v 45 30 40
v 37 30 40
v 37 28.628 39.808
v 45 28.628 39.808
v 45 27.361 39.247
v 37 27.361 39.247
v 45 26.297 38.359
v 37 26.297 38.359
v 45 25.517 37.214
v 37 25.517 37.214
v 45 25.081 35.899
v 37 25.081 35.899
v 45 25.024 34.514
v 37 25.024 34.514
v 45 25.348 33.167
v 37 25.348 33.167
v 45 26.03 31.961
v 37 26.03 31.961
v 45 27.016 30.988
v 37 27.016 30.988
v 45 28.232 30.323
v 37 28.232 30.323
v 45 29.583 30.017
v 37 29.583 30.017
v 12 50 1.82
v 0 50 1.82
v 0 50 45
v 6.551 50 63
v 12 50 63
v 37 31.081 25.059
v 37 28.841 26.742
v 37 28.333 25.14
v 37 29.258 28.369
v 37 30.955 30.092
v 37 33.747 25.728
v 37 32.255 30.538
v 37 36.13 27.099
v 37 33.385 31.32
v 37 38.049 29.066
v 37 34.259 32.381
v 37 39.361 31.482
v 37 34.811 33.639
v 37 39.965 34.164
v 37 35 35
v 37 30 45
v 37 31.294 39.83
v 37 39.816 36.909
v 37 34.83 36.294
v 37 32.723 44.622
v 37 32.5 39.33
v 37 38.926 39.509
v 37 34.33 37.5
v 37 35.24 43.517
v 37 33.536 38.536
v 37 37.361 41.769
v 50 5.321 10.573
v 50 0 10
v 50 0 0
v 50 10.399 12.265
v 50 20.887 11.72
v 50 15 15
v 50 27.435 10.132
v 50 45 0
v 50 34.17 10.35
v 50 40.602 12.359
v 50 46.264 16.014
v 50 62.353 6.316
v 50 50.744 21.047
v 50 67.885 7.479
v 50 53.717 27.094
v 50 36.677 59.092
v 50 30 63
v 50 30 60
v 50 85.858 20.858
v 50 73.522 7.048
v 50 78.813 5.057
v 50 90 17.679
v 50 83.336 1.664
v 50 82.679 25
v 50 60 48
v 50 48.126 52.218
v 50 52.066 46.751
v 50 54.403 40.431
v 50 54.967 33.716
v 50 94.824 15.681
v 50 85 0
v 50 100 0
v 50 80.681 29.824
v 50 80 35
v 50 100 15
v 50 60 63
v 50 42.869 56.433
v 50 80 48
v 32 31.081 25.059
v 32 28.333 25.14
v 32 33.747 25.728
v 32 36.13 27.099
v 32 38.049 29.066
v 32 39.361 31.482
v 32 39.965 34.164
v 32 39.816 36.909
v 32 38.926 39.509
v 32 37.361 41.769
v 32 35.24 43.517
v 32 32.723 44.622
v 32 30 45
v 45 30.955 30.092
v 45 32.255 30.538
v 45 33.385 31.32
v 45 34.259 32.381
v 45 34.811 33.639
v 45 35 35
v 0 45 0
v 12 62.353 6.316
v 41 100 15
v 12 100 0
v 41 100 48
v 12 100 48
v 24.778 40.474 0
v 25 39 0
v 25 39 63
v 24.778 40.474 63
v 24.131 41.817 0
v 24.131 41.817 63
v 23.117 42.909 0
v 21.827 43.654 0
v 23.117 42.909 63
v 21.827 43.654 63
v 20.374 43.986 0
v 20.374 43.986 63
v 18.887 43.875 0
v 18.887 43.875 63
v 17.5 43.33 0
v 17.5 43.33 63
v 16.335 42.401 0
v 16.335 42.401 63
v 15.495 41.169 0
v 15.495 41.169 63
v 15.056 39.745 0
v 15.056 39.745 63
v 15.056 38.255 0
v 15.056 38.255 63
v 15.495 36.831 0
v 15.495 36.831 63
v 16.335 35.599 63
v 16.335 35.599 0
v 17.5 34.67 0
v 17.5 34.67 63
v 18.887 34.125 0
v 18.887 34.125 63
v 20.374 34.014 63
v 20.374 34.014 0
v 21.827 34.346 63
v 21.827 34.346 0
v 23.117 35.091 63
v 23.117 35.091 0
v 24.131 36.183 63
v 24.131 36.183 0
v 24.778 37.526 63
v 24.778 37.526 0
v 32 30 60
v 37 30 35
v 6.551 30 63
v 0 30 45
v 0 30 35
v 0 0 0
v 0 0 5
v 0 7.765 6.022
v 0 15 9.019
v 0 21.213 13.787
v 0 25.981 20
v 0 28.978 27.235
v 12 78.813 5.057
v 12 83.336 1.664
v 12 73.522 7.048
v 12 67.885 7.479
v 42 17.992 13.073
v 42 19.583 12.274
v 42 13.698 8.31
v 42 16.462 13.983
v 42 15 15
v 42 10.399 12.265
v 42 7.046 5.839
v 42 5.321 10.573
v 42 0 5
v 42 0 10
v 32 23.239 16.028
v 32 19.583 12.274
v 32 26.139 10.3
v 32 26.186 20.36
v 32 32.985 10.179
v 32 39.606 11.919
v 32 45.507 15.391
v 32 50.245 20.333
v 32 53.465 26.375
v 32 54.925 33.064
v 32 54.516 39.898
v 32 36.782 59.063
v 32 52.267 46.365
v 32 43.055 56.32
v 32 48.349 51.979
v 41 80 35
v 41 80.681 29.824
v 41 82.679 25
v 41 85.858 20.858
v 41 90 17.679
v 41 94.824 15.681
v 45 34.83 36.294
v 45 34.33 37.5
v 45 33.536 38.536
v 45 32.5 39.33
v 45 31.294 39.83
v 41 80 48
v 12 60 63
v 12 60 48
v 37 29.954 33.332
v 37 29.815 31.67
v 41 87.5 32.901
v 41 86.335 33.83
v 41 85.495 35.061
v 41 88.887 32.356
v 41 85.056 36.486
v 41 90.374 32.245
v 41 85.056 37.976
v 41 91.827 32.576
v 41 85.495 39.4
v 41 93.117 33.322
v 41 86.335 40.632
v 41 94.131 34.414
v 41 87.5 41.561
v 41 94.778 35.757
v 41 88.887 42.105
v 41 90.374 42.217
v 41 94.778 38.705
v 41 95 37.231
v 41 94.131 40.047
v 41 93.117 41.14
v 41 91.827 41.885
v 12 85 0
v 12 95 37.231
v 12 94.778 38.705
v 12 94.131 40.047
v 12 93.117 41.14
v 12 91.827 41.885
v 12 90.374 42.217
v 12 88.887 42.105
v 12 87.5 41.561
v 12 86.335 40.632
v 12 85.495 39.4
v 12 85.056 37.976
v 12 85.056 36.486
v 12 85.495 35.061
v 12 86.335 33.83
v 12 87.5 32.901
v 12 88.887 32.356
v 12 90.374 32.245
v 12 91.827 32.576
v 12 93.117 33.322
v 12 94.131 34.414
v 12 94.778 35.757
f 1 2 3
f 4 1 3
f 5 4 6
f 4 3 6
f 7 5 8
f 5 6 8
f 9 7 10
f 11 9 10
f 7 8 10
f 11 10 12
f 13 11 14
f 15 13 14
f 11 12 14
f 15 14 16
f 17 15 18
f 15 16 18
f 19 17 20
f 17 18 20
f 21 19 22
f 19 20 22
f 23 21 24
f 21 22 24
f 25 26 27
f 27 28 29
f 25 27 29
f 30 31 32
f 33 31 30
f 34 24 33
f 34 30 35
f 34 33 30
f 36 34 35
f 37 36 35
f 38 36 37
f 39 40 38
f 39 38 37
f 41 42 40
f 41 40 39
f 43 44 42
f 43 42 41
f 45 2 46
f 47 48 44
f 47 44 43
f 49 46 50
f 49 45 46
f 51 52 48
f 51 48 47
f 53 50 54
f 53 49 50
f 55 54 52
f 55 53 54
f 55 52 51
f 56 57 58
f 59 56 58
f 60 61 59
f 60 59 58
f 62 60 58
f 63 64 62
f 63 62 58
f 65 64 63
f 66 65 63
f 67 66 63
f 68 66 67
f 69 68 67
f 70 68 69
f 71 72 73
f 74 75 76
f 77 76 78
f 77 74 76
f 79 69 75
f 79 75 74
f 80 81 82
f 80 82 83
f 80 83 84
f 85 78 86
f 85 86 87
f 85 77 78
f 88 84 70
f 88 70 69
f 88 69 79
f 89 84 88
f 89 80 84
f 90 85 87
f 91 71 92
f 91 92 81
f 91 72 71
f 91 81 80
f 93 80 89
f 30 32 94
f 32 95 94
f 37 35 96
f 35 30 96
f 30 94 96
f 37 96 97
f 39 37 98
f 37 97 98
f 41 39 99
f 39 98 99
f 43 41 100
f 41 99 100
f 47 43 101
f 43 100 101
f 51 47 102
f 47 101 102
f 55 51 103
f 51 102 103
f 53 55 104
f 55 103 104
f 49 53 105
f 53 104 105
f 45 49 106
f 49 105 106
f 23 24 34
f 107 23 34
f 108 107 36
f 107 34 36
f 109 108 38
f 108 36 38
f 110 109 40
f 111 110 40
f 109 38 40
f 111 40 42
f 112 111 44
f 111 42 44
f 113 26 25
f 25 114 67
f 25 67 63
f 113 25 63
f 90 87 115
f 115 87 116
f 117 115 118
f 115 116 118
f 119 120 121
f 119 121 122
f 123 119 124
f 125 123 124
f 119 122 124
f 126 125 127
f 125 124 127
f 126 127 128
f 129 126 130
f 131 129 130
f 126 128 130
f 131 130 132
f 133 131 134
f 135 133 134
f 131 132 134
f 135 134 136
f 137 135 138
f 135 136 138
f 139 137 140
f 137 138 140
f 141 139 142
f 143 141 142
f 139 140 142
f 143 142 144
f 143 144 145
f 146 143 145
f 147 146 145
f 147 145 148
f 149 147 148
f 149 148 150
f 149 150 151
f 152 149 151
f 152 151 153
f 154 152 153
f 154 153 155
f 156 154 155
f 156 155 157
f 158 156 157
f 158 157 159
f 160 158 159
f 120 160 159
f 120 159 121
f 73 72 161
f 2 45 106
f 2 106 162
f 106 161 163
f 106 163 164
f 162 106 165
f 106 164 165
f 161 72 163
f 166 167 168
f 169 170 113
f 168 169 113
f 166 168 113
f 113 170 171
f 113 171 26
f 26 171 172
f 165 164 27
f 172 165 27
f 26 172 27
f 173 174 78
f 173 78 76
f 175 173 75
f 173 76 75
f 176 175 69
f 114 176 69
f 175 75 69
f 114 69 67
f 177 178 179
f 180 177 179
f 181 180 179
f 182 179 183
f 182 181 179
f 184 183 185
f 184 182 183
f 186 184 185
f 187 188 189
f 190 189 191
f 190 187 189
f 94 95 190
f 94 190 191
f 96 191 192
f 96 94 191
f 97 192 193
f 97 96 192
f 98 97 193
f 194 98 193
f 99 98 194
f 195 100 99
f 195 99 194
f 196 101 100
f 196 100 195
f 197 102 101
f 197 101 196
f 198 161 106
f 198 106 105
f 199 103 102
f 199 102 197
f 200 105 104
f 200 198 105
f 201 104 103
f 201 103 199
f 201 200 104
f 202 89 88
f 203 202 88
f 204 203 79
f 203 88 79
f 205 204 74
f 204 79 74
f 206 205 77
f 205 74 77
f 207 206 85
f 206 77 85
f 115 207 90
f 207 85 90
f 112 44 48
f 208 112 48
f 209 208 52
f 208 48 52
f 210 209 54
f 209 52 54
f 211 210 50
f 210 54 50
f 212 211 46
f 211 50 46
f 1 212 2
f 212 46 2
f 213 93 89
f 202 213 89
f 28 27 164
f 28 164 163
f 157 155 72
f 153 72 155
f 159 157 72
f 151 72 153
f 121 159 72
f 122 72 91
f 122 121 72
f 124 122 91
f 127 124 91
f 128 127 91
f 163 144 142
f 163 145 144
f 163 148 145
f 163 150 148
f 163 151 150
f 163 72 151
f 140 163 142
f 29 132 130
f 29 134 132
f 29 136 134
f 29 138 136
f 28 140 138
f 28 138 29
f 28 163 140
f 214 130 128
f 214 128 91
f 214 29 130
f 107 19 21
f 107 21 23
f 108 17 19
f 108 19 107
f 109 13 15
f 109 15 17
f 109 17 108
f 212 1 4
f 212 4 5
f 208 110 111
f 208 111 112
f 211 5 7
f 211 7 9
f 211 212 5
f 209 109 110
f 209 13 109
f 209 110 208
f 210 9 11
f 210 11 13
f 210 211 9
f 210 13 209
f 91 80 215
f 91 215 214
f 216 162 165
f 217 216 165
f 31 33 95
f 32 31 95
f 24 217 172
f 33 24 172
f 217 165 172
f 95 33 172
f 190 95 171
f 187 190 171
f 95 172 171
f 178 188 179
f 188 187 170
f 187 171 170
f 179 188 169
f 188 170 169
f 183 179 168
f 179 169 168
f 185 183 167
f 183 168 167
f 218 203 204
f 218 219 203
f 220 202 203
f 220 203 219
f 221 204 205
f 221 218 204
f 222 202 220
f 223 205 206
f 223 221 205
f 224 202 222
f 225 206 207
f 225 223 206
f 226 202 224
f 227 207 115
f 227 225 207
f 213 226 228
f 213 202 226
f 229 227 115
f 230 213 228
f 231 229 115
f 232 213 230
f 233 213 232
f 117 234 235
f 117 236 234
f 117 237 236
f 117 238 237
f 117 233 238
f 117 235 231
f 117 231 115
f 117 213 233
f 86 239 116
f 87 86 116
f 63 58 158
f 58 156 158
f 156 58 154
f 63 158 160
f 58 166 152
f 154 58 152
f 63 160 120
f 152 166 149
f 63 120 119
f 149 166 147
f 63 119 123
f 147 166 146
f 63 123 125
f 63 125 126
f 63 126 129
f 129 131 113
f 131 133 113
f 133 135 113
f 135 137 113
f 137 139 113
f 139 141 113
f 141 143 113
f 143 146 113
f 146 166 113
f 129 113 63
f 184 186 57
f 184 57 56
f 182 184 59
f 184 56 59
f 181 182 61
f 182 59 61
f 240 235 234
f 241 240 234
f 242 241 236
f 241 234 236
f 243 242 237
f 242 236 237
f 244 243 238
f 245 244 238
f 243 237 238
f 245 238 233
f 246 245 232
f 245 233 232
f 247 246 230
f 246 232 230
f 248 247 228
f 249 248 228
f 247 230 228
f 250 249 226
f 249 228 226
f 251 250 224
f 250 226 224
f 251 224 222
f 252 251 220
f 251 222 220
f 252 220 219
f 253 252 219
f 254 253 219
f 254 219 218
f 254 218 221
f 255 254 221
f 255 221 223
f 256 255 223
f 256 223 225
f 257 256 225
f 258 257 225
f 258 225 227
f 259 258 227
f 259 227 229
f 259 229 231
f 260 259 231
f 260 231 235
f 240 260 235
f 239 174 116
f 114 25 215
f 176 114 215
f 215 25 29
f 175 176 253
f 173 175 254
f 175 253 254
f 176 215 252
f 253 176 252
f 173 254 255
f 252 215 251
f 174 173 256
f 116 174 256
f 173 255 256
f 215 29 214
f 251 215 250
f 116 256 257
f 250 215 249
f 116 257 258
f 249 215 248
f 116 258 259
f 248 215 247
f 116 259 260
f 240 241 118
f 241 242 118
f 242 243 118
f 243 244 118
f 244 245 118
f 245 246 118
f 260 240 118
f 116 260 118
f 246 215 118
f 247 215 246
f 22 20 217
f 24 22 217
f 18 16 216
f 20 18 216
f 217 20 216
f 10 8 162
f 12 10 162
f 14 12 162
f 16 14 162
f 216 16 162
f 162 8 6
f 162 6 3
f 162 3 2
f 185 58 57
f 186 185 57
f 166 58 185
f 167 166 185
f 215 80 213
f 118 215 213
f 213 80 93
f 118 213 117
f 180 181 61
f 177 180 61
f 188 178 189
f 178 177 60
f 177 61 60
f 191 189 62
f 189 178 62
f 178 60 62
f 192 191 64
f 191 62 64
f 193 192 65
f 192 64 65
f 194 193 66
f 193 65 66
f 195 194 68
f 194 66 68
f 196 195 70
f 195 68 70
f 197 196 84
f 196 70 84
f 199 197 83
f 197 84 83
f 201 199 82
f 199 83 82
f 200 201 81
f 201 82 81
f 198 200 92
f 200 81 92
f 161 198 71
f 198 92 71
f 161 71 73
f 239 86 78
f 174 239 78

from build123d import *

# Parameters (mm, degrees)
F0_W      = 100
F0_H      = 63
F1_DEPTH  = 50
F3_DEPTH  = 50.001
F4_W      = 40
F4_H      = 15
F5_DEPTH  = 50.001
F7_DEPTH  = 9
F8_R      = 5
F9_DEPTH  = 41.001
F10_W     = 12
F10_H     = 10
F10_H_2   = 40
F11_DEPTH = 63.001
F13_DEPTH = 187
F15_DEPTH = 100.001
F16_R     = 25
F17_DEPTH = 18
F18_R     = 10
F19_DEPTH = 5
F22_DEPTH = 42
F20_R     = 25
F23_DEPTH = 8
F25_DEPTH = 8
F26_W     = 40
F26_H     = 9
F27_DEPTH = 8.001
F28_R     = 5
F29_DEPTH = 63.001


# Not quite as in the source:
# - an extrude ends at something that could not be found from the text; its depth is read off the source's solid


with BuildPart() as f1:
    # F0 (on Right) → F1 (new body)
    with BuildSketch(Plane.YZ):
        with Locations((50, 31.5)):
            Rectangle(F0_W, F0_H)
    extrude(amount=F1_DEPTH)

    # F2 (on face) → F3 (cut, through all)
    with BuildSketch(Plane.YZ.offset(50)):
        with BuildLine():
            Line((62.353148703, 6.3160295987), (45, 0))
            Line((45, 0), (85, 0))
            Line((85, 0), (83.3356871933, 1.6643128067))
            ThreePointArc((83.3356871933, 1.6643128067), (73.5223438483, 7.0480973254), (62.353148703, 6.3160295987))
        make_face()
    extrude(amount=-F3_DEPTH, mode=Mode.SUBTRACT)

    # F4 (on face) → F5 (cut, through all)
    with BuildSketch(Plane.YZ.offset(50)):
        with Locations((80, 55.5)):
            Rectangle(F4_W, F4_H)
    extrude(amount=-F5_DEPTH, mode=Mode.SUBTRACT)

    # F6 (on face) → F7 (cut)
    with BuildSketch(Plane.YZ.offset(50)):
        with BuildLine():
            ThreePointArc((84.8013158464, 48), (81.2386876382, 41.9291527956), (80, 35))
            ThreePointArc((80, 35), (85.8578643763, 20.8578643763), (100, 15))
            Line((100, 15), (100, 48))
            Line((100, 48), (84.8013158464, 48))
        make_face()
        with BuildLine():
            Line((80, 48), (80, 35))
            ThreePointArc((80, 35), (81.2386876382, 41.9291527956), (84.8013158464, 48))
            Line((84.8013158464, 48), (80, 48))
        make_face()
    extrude(amount=-F7_DEPTH, mode=Mode.SUBTRACT)

    # F8 (on face) → F9 (cut, through all)
    with BuildSketch(Plane.YZ.offset(41)):
        with Locations((90, 37.2308082879)):
            Circle(F8_R)
    extrude(amount=-F9_DEPTH, mode=Mode.SUBTRACT)

    # F10 (on face) → F11 (cut, through all)
    with BuildSketch(Plane.XY.offset(63)):
        with Locations((6, 55)):
            Rectangle(F10_W, F10_H)
        with Locations((6, 80)):
            Rectangle(F10_W, F10_H_2)
    extrude(amount=-F11_DEPTH, mode=Mode.SUBTRACT)

    # F12 (on face) → F13 (cut, through all)
    with BuildSketch(Plane.XZ):
        Polygon((0, 63), (0, 45), (6.5514642168, 63), align=None)
    extrude(amount=F13_DEPTH, mode=Mode.SUBTRACT)

    # F14 (on face) → F15 (cut, through all)
    with BuildSketch(Plane.XZ):
        Polygon((0, 63), (0, 45), (6.5514642168, 63), align=None)
    extrude(amount=-F15_DEPTH, mode=Mode.SUBTRACT)

    # F16 (on face) → F17 (cut)
    with BuildSketch(Plane.YZ.offset(50)):
        with Locations((30, 35)):
            Circle(F16_R)
    extrude(amount=-F17_DEPTH, mode=Mode.SUBTRACT)

    # F18 (on face) → F19 (join)
    with BuildSketch(Plane.YZ.offset(32)):
        with Locations((30, 35)):
            Circle(F18_R)
    extrude(amount=F19_DEPTH)

    # F21 (on face) → F22 (cut)
    with BuildSketch(Plane(origin=(0, 0, 0), x_dir=(0, -1, 0), z_dir=(-1, 0, 0))):
        with BuildLine():
            Line((-30, 63), (-30, 35))
            ThreePointArc((-30, 35), (21.9316580473, 14.5304524892), (-2.0665083135, 64.9287410926))
            Line((-2.0665083135, 64.9287410926), (-30, 63))
        make_face()
    extrude(amount=-F22_DEPTH, mode=Mode.SUBTRACT)

    # F20 (on face) → F23 (cut)
    with BuildSketch(Plane.YZ.offset(50)):
        with Locations((0, 35)):
            Circle(F20_R)
    extrude(amount=-F23_DEPTH, mode=Mode.SUBTRACT)

    # F24 (on face) → F25 (join)
    with BuildSketch(Plane.YZ.offset(37)):
        with BuildLine():
            ThreePointArc((29.5833333333, 30.017391357), (33.3850160019, 31.320099639), (35, 35))
            ThreePointArc((35, 35), (33.5355339059, 38.5355339059), (30, 40))
            Line((30, 40), (30, 35))
            ThreePointArc((30, 35), (29.8956518578, 32.5), (29.5833333333, 30.017391357))
        make_face()
        with BuildLine():
            Line((30, 35), (30, 40))
            ThreePointArc((30, 40), (25.0043497313, 35.2085147299), (29.5833333333, 30.017391357))
            ThreePointArc((29.5833333333, 30.017391357), (29.8956518578, 32.5), (30, 35))
        make_face()
    extrude(amount=F25_DEPTH)

    # F26 (on face) → F27 (cut, through all)
    with BuildSketch(Plane(origin=(42, 0, 0), x_dir=(0, -1, 0), z_dir=(-1, 0, 0))):
        with Locations((-10, 58.5)):
            Rectangle(F26_W, F26_H)
    extrude(amount=-F27_DEPTH, mode=Mode.SUBTRACT)

    # F28 (on face) → F29 (cut, through all)
    with BuildSketch(Plane.XY.offset(63)):
        with Locations((20, 39)):
            Circle(F28_R)
    extrude(amount=-F29_DEPTH, mode=Mode.SUBTRACT)


solid = f1.part
